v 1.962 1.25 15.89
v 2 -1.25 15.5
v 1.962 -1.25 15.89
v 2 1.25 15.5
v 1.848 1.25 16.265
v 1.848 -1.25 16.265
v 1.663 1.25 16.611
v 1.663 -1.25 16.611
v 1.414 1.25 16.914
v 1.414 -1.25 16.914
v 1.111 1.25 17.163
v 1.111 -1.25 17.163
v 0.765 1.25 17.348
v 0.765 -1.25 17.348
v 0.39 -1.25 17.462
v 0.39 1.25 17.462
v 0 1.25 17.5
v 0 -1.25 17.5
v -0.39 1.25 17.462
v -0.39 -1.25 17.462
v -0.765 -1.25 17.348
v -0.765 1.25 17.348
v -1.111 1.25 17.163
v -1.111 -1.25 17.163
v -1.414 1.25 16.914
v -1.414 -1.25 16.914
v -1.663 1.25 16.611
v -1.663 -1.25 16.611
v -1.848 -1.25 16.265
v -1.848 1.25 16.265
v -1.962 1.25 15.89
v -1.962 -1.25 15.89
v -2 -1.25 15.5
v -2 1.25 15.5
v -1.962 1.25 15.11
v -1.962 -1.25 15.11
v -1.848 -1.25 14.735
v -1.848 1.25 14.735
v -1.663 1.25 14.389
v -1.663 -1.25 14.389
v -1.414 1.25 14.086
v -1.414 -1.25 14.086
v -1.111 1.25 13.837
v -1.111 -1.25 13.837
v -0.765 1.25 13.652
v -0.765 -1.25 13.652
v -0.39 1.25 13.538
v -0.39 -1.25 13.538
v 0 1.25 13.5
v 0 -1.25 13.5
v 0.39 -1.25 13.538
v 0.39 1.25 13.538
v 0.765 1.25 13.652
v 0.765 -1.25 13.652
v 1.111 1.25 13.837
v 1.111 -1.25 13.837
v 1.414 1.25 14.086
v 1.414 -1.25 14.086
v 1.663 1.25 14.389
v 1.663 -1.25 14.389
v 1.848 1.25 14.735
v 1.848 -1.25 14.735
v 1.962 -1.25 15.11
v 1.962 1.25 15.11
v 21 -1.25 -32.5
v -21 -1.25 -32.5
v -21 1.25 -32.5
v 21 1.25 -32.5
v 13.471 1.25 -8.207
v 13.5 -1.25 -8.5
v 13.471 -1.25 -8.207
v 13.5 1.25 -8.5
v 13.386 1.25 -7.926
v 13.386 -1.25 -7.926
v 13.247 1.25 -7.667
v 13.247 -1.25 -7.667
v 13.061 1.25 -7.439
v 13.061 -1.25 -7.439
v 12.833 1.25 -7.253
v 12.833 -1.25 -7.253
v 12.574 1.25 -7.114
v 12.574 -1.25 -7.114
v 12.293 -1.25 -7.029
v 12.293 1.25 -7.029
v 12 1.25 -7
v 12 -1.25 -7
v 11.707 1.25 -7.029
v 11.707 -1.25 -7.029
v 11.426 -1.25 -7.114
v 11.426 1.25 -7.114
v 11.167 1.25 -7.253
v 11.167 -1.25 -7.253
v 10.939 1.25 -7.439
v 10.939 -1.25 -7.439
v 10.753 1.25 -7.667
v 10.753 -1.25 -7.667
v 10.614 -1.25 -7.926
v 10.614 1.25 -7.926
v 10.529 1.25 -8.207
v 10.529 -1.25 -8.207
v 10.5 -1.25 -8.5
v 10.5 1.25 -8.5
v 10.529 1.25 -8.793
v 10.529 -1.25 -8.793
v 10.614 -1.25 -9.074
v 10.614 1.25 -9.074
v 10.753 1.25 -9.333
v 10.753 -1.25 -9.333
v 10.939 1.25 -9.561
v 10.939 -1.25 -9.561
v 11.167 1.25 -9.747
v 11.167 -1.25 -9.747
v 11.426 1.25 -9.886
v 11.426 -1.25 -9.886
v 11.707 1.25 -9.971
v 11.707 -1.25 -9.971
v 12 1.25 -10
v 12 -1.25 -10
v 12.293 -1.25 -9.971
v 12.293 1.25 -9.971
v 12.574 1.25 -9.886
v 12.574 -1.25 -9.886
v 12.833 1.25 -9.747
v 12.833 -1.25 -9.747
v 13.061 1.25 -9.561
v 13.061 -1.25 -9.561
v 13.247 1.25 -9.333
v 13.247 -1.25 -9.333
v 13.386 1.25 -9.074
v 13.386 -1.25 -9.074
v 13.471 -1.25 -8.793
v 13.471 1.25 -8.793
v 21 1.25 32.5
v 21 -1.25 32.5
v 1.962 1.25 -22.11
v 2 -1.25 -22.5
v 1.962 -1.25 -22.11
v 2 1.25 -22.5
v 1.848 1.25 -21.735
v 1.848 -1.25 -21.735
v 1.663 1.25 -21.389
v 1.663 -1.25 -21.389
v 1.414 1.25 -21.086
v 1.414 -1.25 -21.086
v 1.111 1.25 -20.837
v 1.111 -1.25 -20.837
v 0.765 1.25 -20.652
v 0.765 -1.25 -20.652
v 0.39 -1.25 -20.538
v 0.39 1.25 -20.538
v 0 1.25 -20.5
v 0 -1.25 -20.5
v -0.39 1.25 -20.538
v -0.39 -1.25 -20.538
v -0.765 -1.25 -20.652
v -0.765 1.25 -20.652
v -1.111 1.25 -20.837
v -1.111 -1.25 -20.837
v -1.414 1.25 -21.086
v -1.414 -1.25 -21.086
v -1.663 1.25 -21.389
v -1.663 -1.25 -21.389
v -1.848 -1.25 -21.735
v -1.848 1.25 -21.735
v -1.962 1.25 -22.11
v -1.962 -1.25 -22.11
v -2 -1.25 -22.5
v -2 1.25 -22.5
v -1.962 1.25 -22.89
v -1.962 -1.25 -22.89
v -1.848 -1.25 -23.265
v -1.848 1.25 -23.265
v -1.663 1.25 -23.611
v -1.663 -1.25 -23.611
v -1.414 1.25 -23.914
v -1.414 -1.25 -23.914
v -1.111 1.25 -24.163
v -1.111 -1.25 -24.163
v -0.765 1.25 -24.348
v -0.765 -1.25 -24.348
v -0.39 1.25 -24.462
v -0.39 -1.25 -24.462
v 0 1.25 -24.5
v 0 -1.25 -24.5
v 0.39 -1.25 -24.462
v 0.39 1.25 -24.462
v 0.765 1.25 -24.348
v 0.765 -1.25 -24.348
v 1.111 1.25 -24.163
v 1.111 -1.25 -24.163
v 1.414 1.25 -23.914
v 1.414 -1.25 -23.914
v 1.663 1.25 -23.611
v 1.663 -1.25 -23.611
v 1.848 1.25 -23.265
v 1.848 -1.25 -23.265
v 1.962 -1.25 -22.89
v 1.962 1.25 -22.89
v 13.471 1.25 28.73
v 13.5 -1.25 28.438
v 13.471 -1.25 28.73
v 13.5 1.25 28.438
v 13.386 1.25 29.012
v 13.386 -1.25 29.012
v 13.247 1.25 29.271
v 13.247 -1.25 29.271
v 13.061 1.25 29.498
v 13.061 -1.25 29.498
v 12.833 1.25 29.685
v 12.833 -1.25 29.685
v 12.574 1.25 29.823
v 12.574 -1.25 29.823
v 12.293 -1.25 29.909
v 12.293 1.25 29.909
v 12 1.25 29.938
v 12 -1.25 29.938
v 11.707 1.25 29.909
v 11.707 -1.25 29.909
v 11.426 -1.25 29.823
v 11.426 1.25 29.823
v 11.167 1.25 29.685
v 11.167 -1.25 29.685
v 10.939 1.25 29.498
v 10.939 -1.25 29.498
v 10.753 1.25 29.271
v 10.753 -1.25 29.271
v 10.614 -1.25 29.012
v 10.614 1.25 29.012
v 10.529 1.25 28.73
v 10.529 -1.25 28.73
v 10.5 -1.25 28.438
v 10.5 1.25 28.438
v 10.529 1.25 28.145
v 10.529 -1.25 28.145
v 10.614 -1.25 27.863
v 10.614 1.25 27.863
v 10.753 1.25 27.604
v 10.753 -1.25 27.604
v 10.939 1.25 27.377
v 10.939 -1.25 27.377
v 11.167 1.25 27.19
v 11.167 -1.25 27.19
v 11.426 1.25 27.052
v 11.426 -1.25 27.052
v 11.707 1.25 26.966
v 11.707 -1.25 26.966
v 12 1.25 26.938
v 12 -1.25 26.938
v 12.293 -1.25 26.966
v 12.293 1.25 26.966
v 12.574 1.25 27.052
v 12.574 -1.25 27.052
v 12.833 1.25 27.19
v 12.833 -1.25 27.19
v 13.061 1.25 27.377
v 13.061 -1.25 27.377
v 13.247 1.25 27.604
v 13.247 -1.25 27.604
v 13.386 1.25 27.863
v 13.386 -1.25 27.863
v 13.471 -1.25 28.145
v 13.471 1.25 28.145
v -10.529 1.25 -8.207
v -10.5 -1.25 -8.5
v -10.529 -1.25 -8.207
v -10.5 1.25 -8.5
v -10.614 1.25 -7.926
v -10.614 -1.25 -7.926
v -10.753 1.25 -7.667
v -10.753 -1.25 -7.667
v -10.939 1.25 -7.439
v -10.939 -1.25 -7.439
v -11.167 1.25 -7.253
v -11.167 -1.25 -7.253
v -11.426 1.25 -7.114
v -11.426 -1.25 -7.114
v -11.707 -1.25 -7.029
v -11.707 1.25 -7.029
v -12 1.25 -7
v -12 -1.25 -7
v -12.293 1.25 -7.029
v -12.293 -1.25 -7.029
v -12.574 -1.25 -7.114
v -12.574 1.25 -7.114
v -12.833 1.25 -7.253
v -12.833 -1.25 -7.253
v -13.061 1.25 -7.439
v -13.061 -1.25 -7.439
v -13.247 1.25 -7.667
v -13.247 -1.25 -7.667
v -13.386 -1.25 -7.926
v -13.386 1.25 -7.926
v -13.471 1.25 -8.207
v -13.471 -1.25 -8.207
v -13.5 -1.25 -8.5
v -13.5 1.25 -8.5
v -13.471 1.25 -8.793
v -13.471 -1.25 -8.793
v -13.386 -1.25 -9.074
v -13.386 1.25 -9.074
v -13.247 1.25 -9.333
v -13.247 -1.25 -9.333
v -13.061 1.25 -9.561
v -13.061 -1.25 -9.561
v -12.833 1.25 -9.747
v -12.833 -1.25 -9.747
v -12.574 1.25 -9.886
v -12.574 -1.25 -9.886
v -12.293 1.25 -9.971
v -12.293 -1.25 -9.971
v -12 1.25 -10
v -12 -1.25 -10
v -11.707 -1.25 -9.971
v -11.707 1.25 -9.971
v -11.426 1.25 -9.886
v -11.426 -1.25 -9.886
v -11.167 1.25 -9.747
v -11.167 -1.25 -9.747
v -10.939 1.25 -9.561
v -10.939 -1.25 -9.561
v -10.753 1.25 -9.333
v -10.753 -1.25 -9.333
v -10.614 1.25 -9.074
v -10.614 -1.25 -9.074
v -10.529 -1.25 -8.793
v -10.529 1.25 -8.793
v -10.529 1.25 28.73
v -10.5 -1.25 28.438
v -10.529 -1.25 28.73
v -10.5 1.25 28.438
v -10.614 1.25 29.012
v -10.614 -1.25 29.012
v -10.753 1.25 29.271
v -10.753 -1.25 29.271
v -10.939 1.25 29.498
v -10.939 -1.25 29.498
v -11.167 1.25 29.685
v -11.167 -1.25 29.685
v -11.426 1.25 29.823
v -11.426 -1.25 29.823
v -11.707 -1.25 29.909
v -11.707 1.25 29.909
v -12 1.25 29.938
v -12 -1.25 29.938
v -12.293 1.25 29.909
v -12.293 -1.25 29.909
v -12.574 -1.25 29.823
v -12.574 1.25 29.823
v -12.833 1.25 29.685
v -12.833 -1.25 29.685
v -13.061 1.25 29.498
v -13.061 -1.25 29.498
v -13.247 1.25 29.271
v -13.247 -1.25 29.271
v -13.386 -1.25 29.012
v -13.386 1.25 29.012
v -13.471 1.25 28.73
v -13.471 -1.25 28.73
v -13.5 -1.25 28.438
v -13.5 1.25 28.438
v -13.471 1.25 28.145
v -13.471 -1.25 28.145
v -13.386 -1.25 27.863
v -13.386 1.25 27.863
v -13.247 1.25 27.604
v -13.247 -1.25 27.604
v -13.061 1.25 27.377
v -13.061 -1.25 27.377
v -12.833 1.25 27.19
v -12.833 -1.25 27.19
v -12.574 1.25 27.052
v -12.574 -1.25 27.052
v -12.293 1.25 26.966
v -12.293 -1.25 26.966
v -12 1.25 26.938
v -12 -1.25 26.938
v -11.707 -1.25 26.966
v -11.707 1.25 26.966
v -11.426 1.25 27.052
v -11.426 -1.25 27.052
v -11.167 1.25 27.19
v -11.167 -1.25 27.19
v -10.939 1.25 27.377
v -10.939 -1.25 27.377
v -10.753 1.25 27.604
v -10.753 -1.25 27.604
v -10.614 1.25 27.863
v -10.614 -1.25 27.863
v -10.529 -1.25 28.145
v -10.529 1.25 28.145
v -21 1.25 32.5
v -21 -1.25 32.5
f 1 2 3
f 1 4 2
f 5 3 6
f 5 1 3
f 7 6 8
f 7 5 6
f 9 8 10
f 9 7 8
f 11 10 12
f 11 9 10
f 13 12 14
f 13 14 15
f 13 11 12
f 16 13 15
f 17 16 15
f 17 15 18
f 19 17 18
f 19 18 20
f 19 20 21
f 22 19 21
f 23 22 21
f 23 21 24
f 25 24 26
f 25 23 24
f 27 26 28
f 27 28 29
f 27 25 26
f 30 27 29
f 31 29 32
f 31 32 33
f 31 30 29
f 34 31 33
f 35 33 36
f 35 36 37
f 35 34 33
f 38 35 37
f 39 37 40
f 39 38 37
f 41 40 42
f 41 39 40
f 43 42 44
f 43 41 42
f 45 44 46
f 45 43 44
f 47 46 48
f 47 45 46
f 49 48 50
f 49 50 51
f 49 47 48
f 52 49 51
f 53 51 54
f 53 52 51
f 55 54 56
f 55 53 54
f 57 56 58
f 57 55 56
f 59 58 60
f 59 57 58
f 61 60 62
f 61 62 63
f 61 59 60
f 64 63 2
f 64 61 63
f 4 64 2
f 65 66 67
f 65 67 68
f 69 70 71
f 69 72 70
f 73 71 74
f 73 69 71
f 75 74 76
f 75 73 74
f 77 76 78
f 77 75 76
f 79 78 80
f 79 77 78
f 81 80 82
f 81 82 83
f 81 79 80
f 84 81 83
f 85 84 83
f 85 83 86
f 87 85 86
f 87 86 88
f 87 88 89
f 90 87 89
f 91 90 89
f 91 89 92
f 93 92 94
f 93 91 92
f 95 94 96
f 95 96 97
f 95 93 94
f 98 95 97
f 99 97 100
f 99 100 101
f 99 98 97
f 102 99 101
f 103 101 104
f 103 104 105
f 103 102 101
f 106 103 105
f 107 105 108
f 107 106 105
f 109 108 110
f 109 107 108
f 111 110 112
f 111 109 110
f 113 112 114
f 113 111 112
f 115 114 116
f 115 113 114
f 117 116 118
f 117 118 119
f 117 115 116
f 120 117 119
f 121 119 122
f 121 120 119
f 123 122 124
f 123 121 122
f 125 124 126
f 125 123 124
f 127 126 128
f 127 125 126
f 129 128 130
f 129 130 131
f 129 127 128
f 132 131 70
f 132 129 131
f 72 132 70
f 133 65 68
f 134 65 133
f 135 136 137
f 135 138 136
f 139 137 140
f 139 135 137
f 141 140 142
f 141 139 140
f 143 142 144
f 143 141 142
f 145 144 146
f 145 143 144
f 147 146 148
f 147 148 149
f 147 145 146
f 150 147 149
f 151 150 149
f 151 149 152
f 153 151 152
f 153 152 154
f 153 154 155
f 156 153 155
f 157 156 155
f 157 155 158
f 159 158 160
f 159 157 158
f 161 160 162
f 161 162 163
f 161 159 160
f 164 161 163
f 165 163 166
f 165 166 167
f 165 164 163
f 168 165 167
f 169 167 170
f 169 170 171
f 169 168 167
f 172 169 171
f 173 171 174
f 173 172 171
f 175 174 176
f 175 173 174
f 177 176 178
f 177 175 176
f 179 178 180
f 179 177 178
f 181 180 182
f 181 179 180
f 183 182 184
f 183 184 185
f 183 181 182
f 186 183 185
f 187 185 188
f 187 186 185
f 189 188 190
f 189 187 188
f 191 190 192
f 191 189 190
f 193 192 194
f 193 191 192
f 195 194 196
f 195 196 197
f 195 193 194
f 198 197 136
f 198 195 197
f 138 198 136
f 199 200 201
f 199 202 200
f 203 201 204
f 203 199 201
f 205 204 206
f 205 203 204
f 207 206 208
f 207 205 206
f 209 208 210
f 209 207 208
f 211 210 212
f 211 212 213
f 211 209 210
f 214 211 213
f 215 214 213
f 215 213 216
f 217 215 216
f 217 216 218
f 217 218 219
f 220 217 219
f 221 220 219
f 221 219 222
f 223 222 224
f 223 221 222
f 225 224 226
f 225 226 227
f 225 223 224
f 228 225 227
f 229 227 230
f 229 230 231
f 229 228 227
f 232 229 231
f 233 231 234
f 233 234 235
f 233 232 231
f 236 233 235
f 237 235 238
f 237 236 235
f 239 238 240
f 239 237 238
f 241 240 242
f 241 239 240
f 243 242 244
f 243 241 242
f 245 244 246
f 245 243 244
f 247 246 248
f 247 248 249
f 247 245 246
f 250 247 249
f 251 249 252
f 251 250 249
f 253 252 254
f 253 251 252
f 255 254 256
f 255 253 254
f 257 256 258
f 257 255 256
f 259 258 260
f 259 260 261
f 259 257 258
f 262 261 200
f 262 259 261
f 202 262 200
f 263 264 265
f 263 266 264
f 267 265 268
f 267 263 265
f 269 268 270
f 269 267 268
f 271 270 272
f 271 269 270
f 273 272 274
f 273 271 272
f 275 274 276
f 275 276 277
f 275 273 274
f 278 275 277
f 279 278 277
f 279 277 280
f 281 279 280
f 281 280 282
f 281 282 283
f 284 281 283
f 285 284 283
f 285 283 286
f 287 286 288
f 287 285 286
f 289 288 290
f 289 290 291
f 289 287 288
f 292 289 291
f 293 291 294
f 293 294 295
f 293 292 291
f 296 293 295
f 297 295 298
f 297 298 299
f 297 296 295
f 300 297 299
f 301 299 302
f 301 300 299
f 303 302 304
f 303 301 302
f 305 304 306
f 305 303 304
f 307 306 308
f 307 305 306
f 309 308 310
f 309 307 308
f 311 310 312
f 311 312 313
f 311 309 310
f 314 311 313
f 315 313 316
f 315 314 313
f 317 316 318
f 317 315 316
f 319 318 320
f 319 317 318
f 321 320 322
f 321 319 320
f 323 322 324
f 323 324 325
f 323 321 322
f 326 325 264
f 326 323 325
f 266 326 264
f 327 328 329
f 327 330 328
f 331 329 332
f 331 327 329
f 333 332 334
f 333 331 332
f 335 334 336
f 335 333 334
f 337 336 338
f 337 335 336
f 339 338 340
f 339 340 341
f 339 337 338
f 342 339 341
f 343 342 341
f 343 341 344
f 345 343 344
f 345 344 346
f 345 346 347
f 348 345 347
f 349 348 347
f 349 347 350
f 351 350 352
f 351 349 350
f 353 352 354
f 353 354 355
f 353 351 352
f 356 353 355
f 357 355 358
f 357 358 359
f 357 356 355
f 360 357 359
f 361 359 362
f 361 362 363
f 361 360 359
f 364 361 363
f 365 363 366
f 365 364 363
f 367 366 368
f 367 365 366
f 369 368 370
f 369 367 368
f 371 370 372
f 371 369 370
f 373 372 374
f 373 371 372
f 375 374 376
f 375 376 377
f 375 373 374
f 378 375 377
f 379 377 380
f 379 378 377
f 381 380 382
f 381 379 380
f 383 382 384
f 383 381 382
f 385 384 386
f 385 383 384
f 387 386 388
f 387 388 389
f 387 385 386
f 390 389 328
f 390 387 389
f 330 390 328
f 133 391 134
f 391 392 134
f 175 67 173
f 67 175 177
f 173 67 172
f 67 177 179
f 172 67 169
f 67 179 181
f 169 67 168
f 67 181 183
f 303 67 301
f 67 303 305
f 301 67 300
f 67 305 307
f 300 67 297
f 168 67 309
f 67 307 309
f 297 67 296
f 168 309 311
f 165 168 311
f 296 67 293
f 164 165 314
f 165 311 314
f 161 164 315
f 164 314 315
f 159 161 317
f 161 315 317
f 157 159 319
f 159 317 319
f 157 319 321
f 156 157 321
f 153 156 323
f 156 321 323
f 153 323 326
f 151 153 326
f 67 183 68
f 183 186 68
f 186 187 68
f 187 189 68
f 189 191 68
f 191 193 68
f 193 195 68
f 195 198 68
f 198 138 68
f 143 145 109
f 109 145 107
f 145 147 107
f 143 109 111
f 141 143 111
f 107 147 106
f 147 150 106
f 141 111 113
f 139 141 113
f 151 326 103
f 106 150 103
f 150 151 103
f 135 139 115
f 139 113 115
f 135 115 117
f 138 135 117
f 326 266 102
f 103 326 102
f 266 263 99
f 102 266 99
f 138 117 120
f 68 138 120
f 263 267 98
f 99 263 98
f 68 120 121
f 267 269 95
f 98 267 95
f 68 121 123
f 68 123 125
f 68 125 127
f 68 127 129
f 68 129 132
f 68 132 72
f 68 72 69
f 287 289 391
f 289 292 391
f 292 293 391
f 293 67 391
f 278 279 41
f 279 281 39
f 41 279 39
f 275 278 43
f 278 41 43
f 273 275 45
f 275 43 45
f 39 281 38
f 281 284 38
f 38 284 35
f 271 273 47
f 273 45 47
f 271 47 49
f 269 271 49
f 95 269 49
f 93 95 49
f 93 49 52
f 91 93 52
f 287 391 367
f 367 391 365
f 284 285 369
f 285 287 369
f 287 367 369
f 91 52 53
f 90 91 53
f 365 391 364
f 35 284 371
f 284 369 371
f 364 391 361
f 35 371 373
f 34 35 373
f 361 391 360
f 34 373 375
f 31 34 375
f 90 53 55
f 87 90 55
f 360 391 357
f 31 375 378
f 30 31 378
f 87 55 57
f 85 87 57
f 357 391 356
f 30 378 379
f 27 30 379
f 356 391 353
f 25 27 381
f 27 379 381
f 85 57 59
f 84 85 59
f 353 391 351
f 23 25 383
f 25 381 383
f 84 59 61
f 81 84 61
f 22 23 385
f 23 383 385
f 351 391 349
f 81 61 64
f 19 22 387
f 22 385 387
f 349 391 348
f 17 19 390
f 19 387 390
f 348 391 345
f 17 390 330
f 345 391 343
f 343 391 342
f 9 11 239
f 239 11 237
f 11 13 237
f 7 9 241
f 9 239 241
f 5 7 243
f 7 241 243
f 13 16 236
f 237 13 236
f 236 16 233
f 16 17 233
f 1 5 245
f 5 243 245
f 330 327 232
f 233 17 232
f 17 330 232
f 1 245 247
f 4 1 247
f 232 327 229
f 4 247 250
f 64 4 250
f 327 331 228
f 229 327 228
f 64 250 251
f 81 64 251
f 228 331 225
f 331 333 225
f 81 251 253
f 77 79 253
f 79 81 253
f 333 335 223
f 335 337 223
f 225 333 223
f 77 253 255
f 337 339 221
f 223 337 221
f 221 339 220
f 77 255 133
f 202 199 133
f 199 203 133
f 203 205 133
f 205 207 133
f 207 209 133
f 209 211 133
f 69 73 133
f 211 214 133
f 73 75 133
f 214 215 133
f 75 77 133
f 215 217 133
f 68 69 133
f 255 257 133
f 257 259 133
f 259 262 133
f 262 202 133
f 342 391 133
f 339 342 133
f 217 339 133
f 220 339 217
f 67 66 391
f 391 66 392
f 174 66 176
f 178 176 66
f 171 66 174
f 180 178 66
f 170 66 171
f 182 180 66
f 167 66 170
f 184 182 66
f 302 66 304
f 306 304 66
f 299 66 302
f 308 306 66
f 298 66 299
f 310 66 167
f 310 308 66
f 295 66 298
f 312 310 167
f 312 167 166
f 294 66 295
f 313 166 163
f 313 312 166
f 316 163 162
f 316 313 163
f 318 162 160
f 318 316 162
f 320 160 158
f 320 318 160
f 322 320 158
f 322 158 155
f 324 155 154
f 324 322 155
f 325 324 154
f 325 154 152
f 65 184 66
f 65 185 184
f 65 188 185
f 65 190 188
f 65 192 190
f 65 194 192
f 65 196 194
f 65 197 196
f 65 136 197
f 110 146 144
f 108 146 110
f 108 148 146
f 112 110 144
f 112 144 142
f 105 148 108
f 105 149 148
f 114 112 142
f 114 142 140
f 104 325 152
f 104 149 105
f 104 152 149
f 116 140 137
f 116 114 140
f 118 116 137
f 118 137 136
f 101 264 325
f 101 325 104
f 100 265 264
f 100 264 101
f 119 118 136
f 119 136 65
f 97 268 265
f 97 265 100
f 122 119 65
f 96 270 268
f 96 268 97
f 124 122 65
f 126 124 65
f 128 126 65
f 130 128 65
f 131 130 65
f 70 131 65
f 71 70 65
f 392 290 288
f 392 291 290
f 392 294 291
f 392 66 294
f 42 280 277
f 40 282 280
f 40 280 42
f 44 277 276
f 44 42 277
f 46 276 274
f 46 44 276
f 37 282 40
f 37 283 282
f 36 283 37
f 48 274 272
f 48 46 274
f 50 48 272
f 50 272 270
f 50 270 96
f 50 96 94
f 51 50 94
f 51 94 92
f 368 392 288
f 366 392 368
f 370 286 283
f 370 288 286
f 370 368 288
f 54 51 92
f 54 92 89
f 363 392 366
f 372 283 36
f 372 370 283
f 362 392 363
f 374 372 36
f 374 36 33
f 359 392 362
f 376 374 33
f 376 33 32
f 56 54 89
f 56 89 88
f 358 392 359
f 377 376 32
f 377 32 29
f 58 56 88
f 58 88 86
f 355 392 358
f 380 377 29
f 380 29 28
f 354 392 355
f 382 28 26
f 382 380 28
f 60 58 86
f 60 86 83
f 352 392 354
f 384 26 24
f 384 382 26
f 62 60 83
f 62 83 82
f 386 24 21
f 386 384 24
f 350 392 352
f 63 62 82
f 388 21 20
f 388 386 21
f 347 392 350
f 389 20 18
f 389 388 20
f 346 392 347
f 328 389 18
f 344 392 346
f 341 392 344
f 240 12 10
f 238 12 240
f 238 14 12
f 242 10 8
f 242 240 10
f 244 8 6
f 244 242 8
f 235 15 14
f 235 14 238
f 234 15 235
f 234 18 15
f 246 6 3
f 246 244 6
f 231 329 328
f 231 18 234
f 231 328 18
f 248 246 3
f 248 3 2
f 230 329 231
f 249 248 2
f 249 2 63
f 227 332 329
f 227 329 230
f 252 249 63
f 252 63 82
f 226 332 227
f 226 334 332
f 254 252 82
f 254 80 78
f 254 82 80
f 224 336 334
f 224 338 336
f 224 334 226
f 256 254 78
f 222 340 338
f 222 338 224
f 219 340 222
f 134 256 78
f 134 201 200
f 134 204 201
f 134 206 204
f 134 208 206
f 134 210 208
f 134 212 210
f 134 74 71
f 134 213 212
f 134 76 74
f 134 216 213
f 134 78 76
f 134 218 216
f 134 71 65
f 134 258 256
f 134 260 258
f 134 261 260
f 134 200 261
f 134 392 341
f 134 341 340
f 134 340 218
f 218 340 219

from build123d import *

# Parameters (mm, degrees)
F0_W     = 42
F0_H     = 65
F0_R     = 1.5
F0_R_2   = 2
F1_DEPTH = 1.25


with BuildPart() as f1:
    # F0 (on Front) → F1 (new body, symmetric)
    with BuildSketch(Plane.XZ):
        Rectangle(F0_W, F0_H)
        with Locations((-12, -8.5)):
            Circle(F0_R, mode=Mode.SUBTRACT)
        with Locations((0, -22.5)):
            Circle(F0_R_2, mode=Mode.SUBTRACT)
        with Locations((12, -8.5)):
            Circle(F0_R, mode=Mode.SUBTRACT)
        with Locations((-12, 28.4375)):
            Circle(F0_R, mode=Mode.SUBTRACT)
        with Locations((0, 15.5)):
            Circle(F0_R_2, mode=Mode.SUBTRACT)
        with Locations((12, 28.4375)):
            Circle(F0_R, mode=Mode.SUBTRACT)
    extrude(amount=F1_DEPTH, both=True)


solid = f1.part
